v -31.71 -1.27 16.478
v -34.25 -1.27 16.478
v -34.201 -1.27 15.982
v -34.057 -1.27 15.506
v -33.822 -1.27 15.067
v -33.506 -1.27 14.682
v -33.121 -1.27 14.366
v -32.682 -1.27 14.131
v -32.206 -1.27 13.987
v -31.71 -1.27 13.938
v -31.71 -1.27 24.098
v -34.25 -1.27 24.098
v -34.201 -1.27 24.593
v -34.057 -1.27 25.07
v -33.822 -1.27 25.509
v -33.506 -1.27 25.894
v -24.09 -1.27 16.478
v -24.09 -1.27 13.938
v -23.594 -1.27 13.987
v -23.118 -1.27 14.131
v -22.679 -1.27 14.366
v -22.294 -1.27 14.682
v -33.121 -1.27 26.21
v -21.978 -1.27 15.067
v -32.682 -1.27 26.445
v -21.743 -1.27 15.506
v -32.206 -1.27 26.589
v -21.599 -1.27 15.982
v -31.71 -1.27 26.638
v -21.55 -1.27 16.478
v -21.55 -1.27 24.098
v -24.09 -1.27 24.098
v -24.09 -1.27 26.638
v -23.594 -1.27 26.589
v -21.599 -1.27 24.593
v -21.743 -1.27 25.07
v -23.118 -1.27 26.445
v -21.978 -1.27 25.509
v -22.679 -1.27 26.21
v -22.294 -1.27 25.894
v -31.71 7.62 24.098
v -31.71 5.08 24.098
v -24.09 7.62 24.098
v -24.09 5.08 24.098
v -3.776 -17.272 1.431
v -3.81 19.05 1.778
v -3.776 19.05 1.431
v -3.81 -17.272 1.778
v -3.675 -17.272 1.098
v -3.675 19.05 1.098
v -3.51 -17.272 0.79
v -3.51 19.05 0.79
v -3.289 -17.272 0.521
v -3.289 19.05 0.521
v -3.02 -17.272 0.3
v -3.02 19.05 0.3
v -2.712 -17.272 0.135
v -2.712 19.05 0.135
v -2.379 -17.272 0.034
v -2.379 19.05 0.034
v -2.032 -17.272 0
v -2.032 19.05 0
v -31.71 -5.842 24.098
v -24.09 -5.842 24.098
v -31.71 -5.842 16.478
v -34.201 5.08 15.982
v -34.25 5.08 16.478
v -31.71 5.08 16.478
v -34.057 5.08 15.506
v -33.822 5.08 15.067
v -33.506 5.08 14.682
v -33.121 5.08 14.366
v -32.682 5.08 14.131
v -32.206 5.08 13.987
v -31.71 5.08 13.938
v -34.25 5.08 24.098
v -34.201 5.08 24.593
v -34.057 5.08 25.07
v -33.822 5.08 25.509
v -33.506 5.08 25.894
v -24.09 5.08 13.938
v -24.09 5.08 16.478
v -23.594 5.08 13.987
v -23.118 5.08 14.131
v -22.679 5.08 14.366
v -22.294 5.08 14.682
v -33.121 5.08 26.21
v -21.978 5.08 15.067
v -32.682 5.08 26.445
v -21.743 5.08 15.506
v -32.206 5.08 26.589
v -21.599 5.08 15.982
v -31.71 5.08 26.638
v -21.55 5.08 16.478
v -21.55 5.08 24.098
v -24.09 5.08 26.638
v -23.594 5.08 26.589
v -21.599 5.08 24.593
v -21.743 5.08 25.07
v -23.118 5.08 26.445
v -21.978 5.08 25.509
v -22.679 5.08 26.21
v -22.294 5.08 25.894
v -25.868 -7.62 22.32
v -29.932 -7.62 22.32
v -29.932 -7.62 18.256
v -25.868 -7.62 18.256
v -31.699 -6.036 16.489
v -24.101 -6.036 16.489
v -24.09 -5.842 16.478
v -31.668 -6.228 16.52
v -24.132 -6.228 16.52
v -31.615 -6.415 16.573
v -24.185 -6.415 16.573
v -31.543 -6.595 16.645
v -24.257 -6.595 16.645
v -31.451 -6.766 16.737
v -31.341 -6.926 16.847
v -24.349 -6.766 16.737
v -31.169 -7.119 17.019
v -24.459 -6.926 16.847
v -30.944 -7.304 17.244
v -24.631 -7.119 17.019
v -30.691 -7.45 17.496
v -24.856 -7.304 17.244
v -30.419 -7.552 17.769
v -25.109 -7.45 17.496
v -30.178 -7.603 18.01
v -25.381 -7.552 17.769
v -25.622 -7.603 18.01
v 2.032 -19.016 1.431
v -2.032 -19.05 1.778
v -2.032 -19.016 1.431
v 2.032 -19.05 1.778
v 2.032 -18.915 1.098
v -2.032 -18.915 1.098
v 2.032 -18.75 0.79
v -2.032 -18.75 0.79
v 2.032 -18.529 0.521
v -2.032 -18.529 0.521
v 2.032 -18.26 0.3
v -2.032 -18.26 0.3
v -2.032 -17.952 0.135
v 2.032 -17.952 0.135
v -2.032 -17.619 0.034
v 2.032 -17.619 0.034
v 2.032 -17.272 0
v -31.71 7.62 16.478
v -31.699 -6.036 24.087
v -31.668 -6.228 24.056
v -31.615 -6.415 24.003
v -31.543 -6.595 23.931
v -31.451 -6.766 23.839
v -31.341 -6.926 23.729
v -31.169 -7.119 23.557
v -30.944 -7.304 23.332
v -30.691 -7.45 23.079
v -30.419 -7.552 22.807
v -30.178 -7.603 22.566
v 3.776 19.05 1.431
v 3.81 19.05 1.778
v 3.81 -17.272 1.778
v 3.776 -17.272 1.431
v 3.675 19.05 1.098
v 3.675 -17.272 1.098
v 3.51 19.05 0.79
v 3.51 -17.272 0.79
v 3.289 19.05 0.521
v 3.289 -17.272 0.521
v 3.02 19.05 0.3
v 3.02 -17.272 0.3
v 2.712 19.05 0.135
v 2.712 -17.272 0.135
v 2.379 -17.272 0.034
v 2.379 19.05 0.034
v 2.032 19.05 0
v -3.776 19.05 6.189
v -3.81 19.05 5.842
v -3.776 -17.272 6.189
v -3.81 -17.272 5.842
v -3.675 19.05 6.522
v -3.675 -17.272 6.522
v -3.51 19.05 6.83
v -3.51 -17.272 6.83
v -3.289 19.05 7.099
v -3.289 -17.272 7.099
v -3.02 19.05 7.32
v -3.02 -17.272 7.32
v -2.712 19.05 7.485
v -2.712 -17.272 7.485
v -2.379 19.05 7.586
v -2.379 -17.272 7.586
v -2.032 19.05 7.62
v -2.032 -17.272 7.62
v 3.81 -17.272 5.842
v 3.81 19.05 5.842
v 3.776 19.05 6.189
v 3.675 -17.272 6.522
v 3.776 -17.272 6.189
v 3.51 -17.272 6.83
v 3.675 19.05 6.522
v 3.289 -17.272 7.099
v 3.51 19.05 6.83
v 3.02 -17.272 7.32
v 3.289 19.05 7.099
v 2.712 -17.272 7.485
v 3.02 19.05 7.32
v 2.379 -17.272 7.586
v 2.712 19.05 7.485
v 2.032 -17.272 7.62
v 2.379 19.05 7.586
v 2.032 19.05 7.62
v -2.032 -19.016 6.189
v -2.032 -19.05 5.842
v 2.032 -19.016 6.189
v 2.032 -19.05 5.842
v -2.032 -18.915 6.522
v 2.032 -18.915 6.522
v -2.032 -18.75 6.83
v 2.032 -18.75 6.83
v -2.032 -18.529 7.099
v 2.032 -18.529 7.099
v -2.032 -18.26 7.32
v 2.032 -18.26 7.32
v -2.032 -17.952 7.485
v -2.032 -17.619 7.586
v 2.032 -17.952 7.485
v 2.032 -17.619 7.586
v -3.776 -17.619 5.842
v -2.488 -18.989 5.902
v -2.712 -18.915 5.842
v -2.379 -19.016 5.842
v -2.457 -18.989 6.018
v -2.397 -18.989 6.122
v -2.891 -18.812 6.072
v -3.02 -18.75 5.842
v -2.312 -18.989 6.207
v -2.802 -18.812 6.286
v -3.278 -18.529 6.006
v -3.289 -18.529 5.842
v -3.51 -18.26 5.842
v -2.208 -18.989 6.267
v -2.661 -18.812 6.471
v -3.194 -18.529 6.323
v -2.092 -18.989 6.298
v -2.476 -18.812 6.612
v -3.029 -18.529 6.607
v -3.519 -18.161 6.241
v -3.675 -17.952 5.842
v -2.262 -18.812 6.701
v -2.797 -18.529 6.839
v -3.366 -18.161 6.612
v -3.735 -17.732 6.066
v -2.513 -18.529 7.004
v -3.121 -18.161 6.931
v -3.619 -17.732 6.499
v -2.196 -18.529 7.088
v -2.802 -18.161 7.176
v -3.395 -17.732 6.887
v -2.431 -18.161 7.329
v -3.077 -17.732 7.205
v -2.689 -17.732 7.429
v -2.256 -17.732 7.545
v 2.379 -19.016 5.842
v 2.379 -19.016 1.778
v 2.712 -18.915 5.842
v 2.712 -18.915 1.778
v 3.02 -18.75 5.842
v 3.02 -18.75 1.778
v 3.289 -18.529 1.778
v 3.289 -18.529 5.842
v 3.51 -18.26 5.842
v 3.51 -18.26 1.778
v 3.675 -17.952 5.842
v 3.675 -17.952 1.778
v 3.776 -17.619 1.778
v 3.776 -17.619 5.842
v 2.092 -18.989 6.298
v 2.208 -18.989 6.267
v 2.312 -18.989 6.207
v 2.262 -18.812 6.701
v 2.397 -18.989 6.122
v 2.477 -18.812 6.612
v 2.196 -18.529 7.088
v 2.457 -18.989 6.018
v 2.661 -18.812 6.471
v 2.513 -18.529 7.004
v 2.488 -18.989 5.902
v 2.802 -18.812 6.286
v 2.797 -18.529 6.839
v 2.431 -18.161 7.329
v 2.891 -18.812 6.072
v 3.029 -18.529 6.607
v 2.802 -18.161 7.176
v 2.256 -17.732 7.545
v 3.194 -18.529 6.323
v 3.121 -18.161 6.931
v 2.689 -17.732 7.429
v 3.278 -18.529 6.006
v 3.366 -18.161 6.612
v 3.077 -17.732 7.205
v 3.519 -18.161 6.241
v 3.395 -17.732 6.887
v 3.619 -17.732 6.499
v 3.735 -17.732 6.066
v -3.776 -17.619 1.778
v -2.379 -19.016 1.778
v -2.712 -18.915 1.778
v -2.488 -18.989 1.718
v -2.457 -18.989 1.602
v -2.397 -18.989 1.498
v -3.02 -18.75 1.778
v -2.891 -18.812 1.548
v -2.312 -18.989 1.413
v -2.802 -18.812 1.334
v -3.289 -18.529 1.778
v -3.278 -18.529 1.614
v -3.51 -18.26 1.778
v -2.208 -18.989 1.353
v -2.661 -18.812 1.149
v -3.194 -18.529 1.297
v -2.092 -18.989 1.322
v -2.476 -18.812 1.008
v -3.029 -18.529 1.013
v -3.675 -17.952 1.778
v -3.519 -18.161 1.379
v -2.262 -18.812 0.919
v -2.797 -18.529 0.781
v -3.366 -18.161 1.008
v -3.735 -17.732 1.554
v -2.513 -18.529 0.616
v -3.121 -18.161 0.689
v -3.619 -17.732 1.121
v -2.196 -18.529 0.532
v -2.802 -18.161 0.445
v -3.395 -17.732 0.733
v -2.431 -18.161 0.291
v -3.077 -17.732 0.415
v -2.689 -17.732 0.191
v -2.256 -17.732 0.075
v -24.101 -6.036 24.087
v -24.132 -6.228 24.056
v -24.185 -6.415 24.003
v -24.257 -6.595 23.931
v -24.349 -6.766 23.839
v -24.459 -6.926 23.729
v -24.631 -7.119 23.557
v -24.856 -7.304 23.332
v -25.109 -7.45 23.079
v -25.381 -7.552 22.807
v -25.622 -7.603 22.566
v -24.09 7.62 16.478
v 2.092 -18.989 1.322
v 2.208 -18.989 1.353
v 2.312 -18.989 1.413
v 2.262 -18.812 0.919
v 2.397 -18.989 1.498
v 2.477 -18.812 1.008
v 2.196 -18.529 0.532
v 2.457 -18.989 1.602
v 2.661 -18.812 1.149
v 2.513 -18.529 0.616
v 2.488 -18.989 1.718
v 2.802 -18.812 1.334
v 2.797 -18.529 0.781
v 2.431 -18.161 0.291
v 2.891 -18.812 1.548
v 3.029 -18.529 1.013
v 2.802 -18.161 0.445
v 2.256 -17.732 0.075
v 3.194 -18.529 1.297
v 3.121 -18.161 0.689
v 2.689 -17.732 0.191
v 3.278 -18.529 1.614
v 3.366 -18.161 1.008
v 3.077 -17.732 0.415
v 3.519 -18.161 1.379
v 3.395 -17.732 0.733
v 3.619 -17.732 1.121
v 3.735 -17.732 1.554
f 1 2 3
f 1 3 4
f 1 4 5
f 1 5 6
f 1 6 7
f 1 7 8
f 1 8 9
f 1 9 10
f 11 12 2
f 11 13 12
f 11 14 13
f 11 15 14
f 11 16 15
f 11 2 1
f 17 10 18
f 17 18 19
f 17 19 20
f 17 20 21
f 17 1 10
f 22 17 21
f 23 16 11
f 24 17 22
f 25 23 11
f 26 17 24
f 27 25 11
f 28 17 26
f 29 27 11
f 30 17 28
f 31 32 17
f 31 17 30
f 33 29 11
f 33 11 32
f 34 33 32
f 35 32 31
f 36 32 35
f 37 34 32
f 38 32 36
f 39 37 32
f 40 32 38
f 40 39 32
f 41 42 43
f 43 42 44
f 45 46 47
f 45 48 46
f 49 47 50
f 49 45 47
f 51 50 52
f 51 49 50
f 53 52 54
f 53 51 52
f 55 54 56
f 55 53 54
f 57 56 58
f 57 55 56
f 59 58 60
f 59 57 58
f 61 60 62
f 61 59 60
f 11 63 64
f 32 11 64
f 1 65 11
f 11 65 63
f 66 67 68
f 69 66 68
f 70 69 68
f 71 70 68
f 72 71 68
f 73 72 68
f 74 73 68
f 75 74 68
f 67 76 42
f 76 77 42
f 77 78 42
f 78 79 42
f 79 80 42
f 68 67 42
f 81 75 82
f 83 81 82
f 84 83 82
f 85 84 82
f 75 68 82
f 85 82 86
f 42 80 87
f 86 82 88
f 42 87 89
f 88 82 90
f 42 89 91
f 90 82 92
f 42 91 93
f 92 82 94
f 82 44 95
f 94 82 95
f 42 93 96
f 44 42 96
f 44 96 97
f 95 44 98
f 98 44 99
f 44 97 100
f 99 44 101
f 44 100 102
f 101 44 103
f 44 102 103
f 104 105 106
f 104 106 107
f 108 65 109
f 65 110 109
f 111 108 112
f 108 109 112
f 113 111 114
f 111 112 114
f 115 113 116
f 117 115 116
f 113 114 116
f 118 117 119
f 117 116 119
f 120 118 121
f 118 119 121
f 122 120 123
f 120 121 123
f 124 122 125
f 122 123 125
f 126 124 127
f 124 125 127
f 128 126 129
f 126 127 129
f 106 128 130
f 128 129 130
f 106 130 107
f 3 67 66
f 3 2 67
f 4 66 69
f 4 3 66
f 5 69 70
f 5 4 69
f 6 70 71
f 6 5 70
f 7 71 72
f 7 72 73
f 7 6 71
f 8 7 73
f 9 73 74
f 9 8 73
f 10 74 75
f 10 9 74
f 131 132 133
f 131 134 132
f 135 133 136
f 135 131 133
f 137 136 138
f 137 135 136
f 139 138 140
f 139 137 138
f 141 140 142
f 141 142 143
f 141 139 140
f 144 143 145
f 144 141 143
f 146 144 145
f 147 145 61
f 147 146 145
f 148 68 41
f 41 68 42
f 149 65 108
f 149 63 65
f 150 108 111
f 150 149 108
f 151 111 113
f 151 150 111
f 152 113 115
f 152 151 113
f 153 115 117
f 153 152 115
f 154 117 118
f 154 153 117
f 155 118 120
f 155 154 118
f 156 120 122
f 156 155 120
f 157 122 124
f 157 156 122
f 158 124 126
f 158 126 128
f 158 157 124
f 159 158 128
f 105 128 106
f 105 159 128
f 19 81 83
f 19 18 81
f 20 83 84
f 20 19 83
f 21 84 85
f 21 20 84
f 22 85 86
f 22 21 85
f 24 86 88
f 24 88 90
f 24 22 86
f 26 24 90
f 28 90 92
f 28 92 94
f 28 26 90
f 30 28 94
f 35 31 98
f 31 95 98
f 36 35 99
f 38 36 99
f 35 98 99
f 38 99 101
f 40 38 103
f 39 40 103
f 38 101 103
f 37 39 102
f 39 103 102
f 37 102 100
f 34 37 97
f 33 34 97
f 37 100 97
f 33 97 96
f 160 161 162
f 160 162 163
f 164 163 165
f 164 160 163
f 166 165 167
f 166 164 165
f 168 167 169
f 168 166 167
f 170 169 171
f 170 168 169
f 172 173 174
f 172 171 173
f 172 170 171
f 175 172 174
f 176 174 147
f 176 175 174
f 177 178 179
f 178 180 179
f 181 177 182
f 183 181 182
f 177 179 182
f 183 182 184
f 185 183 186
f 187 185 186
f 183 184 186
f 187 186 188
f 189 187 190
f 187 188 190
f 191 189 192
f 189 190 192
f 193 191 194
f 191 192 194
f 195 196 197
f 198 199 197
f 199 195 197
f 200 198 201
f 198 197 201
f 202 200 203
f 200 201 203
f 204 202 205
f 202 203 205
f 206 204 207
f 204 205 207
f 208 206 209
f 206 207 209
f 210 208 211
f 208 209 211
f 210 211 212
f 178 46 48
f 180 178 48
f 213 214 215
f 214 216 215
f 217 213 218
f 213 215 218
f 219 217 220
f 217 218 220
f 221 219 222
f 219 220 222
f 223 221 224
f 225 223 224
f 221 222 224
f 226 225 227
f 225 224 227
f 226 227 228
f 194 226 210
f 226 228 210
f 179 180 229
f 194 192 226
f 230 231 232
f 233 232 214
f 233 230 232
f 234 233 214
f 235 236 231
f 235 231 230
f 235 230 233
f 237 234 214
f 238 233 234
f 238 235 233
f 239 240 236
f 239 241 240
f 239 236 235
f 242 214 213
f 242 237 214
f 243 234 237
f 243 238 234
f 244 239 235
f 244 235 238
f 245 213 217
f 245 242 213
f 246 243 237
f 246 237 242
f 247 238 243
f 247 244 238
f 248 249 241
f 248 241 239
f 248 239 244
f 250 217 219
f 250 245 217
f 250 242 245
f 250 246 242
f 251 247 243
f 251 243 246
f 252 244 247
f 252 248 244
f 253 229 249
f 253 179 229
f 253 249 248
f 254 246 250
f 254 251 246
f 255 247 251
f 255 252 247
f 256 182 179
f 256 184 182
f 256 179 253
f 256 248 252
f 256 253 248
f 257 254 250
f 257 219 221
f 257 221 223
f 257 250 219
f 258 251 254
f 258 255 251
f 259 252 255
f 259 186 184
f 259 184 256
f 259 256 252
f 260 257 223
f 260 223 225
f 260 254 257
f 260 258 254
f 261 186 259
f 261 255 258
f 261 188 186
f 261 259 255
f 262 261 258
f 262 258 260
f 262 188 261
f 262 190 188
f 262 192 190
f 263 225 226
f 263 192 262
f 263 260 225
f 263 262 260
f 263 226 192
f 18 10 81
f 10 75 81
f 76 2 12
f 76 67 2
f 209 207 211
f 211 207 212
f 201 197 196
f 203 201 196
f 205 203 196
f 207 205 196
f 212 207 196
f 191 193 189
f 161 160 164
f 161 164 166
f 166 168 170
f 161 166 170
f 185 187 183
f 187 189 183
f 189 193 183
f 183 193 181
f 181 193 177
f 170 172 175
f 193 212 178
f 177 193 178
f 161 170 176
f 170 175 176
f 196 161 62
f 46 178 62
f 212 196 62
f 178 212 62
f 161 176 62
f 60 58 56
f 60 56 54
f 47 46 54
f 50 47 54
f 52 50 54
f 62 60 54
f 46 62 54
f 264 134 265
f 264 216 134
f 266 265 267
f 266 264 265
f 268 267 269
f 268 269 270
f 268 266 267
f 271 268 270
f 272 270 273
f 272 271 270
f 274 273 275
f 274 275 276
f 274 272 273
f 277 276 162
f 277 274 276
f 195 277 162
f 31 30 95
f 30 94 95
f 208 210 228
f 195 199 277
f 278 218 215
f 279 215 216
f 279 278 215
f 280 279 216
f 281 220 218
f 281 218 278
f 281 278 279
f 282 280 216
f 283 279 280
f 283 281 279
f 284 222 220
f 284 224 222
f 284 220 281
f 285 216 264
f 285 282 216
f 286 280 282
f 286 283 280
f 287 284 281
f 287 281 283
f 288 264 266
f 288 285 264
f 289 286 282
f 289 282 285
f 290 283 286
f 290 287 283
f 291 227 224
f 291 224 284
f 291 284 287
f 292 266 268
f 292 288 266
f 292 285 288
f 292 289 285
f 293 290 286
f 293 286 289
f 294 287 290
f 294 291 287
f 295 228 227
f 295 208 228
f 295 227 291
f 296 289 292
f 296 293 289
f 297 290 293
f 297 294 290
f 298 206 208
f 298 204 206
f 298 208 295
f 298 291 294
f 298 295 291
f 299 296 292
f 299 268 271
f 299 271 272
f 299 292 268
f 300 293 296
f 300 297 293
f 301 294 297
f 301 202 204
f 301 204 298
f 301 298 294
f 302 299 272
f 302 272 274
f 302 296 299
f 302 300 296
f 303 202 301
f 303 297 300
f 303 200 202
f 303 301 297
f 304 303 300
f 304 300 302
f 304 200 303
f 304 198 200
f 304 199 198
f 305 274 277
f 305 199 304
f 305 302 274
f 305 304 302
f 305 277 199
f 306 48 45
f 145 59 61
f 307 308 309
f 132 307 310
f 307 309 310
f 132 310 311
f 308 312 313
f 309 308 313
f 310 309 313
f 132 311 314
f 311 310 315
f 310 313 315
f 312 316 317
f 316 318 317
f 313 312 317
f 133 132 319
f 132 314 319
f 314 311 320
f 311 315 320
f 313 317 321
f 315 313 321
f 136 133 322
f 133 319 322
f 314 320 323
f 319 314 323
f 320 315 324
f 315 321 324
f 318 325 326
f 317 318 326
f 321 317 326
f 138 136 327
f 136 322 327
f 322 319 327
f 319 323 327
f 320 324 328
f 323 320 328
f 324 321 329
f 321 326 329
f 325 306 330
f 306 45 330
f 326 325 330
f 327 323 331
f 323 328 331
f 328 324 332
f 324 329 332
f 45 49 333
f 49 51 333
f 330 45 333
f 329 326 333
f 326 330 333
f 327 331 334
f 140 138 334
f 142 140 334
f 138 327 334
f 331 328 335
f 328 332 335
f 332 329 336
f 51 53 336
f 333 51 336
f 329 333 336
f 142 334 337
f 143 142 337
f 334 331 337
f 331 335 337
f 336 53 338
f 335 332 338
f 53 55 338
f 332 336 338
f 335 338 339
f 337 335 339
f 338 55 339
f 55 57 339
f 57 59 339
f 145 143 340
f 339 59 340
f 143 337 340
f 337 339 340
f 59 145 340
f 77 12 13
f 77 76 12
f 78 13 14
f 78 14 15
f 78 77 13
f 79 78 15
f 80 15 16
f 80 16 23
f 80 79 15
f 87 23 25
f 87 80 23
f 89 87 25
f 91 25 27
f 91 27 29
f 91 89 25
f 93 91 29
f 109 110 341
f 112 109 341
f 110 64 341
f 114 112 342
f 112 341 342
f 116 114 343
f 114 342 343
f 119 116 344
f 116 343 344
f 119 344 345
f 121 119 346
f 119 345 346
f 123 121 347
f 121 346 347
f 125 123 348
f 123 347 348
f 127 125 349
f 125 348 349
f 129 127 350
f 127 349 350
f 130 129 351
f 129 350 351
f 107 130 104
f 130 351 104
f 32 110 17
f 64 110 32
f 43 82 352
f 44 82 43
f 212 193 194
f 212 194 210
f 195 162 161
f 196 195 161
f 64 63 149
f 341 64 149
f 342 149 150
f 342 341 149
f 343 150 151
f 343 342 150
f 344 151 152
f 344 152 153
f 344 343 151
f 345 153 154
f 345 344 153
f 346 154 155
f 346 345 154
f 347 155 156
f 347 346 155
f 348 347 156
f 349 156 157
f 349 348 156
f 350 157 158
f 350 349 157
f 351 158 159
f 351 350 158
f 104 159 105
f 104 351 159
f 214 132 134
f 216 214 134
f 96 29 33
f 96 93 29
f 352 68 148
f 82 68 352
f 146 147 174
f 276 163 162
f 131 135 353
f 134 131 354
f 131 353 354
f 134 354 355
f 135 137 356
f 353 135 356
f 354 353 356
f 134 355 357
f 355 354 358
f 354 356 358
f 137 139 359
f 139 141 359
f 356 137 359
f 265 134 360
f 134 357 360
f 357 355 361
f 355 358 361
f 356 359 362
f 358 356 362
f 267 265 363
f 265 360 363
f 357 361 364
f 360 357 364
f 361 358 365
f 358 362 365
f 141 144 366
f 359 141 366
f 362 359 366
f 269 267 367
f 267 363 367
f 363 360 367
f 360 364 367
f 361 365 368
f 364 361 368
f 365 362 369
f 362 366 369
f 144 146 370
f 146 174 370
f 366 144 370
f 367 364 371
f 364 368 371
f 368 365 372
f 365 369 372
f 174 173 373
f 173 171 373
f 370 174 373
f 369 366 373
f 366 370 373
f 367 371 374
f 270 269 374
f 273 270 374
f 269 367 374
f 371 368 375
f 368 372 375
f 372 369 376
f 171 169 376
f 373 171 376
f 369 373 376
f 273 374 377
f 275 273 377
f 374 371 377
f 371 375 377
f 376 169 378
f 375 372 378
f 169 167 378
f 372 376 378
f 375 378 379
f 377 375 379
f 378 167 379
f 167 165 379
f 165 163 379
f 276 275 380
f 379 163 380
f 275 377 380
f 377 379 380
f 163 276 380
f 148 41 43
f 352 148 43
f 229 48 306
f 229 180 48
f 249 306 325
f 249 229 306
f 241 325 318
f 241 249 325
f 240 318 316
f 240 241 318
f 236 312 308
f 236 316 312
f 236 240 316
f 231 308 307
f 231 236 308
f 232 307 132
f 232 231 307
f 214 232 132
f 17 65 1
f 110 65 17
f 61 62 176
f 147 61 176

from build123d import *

# Parameters (mm, degrees)
F1_DEPTH      = 7.62
F2_R          = 1.778
F3_W          = 7.62
F3_H          = 7.62
F4_DEPTH      = 7.62
F3_W_2        = 12.7
F3_H_2        = 12.7
F5_DEPTH      = 5.08
F5_DEPTH_BACK = 1.27
F6_R          = 2.54
F7_R          = 1.778


with BuildPart() as f1:
    # F0 (on Top) → F1 (new body)
    with BuildSketch(Plane.XY):
        Polygon((0, 0), (0, 19.05), (-3.81, 19.05), (-3.81, -19.05), (0, -19.05), align=None)
        Polygon((3.81, -19.05), (3.81, 19.05), (0, 19.05), (0, 0), (0, -19.05), align=None)
    extrude(amount=F1_DEPTH)

    # F2
    f2_edges = [f1.edges().sort_by_distance(p)[0] for p in [
        (-3.81, 0, 7.62),
        (-3.81, 0, 0),
        (3.81, 0, 7.62),
        (3.81, 0, 0),
        (-3.81, -19.05, 3.81),
        (0, -19.05, 0),
        (0, -19.05, 7.62),
        (3.81, -19.05, 3.81),
    ]]
    fillet(f2_edges, radius=F2_R)


with BuildPart() as f4:
    # F3 (on Front) → F4 (new body, symmetric)
    with BuildSketch(Plane.XZ):
        with Locations((-27.8999991715, 20.2879599677)):
            Rectangle(F3_W, F3_H)
    extrude(amount=F4_DEPTH, both=True)

    # F3 (on Front) → F5 (join, two sides)
    with BuildSketch(Plane.XZ) as f5_sk:
        with Locations((-27.8999991715, 20.2879599677)):
            Rectangle(F3_W_2, F3_H_2)
        with Locations((-27.8999991715, 20.2879599677)):
            Rectangle(F3_W, F3_H, mode=Mode.SUBTRACT)
    extrude(amount=-F5_DEPTH)
    extrude(f5_sk.sketch, amount=F5_DEPTH_BACK)

    # F6
    f6_edges = [f4.edges().sort_by_distance(p)[0] for p in [
        (-34.249999, 1.905, 26.63796),
        (-21.549999, 1.905, 26.63796),
        (-34.249999, 1.905, 13.93796),
        (-21.549999, 1.905, 13.93796),
    ]]
    fillet(f6_edges, radius=F6_R)

    # F7
    f7_edges = [f4.edges().sort_by_distance(p)[0] for p in [
        (-24.089999, -7.62, 20.28796),
        (-31.709999, -7.62, 20.28796),
        (-27.899999, -7.62, 16.47796),
        (-27.899999, -7.62, 24.09796),
    ]]
    fillet(f7_edges, radius=F7_R)


solid = Compound([f1.part, f4.part])
